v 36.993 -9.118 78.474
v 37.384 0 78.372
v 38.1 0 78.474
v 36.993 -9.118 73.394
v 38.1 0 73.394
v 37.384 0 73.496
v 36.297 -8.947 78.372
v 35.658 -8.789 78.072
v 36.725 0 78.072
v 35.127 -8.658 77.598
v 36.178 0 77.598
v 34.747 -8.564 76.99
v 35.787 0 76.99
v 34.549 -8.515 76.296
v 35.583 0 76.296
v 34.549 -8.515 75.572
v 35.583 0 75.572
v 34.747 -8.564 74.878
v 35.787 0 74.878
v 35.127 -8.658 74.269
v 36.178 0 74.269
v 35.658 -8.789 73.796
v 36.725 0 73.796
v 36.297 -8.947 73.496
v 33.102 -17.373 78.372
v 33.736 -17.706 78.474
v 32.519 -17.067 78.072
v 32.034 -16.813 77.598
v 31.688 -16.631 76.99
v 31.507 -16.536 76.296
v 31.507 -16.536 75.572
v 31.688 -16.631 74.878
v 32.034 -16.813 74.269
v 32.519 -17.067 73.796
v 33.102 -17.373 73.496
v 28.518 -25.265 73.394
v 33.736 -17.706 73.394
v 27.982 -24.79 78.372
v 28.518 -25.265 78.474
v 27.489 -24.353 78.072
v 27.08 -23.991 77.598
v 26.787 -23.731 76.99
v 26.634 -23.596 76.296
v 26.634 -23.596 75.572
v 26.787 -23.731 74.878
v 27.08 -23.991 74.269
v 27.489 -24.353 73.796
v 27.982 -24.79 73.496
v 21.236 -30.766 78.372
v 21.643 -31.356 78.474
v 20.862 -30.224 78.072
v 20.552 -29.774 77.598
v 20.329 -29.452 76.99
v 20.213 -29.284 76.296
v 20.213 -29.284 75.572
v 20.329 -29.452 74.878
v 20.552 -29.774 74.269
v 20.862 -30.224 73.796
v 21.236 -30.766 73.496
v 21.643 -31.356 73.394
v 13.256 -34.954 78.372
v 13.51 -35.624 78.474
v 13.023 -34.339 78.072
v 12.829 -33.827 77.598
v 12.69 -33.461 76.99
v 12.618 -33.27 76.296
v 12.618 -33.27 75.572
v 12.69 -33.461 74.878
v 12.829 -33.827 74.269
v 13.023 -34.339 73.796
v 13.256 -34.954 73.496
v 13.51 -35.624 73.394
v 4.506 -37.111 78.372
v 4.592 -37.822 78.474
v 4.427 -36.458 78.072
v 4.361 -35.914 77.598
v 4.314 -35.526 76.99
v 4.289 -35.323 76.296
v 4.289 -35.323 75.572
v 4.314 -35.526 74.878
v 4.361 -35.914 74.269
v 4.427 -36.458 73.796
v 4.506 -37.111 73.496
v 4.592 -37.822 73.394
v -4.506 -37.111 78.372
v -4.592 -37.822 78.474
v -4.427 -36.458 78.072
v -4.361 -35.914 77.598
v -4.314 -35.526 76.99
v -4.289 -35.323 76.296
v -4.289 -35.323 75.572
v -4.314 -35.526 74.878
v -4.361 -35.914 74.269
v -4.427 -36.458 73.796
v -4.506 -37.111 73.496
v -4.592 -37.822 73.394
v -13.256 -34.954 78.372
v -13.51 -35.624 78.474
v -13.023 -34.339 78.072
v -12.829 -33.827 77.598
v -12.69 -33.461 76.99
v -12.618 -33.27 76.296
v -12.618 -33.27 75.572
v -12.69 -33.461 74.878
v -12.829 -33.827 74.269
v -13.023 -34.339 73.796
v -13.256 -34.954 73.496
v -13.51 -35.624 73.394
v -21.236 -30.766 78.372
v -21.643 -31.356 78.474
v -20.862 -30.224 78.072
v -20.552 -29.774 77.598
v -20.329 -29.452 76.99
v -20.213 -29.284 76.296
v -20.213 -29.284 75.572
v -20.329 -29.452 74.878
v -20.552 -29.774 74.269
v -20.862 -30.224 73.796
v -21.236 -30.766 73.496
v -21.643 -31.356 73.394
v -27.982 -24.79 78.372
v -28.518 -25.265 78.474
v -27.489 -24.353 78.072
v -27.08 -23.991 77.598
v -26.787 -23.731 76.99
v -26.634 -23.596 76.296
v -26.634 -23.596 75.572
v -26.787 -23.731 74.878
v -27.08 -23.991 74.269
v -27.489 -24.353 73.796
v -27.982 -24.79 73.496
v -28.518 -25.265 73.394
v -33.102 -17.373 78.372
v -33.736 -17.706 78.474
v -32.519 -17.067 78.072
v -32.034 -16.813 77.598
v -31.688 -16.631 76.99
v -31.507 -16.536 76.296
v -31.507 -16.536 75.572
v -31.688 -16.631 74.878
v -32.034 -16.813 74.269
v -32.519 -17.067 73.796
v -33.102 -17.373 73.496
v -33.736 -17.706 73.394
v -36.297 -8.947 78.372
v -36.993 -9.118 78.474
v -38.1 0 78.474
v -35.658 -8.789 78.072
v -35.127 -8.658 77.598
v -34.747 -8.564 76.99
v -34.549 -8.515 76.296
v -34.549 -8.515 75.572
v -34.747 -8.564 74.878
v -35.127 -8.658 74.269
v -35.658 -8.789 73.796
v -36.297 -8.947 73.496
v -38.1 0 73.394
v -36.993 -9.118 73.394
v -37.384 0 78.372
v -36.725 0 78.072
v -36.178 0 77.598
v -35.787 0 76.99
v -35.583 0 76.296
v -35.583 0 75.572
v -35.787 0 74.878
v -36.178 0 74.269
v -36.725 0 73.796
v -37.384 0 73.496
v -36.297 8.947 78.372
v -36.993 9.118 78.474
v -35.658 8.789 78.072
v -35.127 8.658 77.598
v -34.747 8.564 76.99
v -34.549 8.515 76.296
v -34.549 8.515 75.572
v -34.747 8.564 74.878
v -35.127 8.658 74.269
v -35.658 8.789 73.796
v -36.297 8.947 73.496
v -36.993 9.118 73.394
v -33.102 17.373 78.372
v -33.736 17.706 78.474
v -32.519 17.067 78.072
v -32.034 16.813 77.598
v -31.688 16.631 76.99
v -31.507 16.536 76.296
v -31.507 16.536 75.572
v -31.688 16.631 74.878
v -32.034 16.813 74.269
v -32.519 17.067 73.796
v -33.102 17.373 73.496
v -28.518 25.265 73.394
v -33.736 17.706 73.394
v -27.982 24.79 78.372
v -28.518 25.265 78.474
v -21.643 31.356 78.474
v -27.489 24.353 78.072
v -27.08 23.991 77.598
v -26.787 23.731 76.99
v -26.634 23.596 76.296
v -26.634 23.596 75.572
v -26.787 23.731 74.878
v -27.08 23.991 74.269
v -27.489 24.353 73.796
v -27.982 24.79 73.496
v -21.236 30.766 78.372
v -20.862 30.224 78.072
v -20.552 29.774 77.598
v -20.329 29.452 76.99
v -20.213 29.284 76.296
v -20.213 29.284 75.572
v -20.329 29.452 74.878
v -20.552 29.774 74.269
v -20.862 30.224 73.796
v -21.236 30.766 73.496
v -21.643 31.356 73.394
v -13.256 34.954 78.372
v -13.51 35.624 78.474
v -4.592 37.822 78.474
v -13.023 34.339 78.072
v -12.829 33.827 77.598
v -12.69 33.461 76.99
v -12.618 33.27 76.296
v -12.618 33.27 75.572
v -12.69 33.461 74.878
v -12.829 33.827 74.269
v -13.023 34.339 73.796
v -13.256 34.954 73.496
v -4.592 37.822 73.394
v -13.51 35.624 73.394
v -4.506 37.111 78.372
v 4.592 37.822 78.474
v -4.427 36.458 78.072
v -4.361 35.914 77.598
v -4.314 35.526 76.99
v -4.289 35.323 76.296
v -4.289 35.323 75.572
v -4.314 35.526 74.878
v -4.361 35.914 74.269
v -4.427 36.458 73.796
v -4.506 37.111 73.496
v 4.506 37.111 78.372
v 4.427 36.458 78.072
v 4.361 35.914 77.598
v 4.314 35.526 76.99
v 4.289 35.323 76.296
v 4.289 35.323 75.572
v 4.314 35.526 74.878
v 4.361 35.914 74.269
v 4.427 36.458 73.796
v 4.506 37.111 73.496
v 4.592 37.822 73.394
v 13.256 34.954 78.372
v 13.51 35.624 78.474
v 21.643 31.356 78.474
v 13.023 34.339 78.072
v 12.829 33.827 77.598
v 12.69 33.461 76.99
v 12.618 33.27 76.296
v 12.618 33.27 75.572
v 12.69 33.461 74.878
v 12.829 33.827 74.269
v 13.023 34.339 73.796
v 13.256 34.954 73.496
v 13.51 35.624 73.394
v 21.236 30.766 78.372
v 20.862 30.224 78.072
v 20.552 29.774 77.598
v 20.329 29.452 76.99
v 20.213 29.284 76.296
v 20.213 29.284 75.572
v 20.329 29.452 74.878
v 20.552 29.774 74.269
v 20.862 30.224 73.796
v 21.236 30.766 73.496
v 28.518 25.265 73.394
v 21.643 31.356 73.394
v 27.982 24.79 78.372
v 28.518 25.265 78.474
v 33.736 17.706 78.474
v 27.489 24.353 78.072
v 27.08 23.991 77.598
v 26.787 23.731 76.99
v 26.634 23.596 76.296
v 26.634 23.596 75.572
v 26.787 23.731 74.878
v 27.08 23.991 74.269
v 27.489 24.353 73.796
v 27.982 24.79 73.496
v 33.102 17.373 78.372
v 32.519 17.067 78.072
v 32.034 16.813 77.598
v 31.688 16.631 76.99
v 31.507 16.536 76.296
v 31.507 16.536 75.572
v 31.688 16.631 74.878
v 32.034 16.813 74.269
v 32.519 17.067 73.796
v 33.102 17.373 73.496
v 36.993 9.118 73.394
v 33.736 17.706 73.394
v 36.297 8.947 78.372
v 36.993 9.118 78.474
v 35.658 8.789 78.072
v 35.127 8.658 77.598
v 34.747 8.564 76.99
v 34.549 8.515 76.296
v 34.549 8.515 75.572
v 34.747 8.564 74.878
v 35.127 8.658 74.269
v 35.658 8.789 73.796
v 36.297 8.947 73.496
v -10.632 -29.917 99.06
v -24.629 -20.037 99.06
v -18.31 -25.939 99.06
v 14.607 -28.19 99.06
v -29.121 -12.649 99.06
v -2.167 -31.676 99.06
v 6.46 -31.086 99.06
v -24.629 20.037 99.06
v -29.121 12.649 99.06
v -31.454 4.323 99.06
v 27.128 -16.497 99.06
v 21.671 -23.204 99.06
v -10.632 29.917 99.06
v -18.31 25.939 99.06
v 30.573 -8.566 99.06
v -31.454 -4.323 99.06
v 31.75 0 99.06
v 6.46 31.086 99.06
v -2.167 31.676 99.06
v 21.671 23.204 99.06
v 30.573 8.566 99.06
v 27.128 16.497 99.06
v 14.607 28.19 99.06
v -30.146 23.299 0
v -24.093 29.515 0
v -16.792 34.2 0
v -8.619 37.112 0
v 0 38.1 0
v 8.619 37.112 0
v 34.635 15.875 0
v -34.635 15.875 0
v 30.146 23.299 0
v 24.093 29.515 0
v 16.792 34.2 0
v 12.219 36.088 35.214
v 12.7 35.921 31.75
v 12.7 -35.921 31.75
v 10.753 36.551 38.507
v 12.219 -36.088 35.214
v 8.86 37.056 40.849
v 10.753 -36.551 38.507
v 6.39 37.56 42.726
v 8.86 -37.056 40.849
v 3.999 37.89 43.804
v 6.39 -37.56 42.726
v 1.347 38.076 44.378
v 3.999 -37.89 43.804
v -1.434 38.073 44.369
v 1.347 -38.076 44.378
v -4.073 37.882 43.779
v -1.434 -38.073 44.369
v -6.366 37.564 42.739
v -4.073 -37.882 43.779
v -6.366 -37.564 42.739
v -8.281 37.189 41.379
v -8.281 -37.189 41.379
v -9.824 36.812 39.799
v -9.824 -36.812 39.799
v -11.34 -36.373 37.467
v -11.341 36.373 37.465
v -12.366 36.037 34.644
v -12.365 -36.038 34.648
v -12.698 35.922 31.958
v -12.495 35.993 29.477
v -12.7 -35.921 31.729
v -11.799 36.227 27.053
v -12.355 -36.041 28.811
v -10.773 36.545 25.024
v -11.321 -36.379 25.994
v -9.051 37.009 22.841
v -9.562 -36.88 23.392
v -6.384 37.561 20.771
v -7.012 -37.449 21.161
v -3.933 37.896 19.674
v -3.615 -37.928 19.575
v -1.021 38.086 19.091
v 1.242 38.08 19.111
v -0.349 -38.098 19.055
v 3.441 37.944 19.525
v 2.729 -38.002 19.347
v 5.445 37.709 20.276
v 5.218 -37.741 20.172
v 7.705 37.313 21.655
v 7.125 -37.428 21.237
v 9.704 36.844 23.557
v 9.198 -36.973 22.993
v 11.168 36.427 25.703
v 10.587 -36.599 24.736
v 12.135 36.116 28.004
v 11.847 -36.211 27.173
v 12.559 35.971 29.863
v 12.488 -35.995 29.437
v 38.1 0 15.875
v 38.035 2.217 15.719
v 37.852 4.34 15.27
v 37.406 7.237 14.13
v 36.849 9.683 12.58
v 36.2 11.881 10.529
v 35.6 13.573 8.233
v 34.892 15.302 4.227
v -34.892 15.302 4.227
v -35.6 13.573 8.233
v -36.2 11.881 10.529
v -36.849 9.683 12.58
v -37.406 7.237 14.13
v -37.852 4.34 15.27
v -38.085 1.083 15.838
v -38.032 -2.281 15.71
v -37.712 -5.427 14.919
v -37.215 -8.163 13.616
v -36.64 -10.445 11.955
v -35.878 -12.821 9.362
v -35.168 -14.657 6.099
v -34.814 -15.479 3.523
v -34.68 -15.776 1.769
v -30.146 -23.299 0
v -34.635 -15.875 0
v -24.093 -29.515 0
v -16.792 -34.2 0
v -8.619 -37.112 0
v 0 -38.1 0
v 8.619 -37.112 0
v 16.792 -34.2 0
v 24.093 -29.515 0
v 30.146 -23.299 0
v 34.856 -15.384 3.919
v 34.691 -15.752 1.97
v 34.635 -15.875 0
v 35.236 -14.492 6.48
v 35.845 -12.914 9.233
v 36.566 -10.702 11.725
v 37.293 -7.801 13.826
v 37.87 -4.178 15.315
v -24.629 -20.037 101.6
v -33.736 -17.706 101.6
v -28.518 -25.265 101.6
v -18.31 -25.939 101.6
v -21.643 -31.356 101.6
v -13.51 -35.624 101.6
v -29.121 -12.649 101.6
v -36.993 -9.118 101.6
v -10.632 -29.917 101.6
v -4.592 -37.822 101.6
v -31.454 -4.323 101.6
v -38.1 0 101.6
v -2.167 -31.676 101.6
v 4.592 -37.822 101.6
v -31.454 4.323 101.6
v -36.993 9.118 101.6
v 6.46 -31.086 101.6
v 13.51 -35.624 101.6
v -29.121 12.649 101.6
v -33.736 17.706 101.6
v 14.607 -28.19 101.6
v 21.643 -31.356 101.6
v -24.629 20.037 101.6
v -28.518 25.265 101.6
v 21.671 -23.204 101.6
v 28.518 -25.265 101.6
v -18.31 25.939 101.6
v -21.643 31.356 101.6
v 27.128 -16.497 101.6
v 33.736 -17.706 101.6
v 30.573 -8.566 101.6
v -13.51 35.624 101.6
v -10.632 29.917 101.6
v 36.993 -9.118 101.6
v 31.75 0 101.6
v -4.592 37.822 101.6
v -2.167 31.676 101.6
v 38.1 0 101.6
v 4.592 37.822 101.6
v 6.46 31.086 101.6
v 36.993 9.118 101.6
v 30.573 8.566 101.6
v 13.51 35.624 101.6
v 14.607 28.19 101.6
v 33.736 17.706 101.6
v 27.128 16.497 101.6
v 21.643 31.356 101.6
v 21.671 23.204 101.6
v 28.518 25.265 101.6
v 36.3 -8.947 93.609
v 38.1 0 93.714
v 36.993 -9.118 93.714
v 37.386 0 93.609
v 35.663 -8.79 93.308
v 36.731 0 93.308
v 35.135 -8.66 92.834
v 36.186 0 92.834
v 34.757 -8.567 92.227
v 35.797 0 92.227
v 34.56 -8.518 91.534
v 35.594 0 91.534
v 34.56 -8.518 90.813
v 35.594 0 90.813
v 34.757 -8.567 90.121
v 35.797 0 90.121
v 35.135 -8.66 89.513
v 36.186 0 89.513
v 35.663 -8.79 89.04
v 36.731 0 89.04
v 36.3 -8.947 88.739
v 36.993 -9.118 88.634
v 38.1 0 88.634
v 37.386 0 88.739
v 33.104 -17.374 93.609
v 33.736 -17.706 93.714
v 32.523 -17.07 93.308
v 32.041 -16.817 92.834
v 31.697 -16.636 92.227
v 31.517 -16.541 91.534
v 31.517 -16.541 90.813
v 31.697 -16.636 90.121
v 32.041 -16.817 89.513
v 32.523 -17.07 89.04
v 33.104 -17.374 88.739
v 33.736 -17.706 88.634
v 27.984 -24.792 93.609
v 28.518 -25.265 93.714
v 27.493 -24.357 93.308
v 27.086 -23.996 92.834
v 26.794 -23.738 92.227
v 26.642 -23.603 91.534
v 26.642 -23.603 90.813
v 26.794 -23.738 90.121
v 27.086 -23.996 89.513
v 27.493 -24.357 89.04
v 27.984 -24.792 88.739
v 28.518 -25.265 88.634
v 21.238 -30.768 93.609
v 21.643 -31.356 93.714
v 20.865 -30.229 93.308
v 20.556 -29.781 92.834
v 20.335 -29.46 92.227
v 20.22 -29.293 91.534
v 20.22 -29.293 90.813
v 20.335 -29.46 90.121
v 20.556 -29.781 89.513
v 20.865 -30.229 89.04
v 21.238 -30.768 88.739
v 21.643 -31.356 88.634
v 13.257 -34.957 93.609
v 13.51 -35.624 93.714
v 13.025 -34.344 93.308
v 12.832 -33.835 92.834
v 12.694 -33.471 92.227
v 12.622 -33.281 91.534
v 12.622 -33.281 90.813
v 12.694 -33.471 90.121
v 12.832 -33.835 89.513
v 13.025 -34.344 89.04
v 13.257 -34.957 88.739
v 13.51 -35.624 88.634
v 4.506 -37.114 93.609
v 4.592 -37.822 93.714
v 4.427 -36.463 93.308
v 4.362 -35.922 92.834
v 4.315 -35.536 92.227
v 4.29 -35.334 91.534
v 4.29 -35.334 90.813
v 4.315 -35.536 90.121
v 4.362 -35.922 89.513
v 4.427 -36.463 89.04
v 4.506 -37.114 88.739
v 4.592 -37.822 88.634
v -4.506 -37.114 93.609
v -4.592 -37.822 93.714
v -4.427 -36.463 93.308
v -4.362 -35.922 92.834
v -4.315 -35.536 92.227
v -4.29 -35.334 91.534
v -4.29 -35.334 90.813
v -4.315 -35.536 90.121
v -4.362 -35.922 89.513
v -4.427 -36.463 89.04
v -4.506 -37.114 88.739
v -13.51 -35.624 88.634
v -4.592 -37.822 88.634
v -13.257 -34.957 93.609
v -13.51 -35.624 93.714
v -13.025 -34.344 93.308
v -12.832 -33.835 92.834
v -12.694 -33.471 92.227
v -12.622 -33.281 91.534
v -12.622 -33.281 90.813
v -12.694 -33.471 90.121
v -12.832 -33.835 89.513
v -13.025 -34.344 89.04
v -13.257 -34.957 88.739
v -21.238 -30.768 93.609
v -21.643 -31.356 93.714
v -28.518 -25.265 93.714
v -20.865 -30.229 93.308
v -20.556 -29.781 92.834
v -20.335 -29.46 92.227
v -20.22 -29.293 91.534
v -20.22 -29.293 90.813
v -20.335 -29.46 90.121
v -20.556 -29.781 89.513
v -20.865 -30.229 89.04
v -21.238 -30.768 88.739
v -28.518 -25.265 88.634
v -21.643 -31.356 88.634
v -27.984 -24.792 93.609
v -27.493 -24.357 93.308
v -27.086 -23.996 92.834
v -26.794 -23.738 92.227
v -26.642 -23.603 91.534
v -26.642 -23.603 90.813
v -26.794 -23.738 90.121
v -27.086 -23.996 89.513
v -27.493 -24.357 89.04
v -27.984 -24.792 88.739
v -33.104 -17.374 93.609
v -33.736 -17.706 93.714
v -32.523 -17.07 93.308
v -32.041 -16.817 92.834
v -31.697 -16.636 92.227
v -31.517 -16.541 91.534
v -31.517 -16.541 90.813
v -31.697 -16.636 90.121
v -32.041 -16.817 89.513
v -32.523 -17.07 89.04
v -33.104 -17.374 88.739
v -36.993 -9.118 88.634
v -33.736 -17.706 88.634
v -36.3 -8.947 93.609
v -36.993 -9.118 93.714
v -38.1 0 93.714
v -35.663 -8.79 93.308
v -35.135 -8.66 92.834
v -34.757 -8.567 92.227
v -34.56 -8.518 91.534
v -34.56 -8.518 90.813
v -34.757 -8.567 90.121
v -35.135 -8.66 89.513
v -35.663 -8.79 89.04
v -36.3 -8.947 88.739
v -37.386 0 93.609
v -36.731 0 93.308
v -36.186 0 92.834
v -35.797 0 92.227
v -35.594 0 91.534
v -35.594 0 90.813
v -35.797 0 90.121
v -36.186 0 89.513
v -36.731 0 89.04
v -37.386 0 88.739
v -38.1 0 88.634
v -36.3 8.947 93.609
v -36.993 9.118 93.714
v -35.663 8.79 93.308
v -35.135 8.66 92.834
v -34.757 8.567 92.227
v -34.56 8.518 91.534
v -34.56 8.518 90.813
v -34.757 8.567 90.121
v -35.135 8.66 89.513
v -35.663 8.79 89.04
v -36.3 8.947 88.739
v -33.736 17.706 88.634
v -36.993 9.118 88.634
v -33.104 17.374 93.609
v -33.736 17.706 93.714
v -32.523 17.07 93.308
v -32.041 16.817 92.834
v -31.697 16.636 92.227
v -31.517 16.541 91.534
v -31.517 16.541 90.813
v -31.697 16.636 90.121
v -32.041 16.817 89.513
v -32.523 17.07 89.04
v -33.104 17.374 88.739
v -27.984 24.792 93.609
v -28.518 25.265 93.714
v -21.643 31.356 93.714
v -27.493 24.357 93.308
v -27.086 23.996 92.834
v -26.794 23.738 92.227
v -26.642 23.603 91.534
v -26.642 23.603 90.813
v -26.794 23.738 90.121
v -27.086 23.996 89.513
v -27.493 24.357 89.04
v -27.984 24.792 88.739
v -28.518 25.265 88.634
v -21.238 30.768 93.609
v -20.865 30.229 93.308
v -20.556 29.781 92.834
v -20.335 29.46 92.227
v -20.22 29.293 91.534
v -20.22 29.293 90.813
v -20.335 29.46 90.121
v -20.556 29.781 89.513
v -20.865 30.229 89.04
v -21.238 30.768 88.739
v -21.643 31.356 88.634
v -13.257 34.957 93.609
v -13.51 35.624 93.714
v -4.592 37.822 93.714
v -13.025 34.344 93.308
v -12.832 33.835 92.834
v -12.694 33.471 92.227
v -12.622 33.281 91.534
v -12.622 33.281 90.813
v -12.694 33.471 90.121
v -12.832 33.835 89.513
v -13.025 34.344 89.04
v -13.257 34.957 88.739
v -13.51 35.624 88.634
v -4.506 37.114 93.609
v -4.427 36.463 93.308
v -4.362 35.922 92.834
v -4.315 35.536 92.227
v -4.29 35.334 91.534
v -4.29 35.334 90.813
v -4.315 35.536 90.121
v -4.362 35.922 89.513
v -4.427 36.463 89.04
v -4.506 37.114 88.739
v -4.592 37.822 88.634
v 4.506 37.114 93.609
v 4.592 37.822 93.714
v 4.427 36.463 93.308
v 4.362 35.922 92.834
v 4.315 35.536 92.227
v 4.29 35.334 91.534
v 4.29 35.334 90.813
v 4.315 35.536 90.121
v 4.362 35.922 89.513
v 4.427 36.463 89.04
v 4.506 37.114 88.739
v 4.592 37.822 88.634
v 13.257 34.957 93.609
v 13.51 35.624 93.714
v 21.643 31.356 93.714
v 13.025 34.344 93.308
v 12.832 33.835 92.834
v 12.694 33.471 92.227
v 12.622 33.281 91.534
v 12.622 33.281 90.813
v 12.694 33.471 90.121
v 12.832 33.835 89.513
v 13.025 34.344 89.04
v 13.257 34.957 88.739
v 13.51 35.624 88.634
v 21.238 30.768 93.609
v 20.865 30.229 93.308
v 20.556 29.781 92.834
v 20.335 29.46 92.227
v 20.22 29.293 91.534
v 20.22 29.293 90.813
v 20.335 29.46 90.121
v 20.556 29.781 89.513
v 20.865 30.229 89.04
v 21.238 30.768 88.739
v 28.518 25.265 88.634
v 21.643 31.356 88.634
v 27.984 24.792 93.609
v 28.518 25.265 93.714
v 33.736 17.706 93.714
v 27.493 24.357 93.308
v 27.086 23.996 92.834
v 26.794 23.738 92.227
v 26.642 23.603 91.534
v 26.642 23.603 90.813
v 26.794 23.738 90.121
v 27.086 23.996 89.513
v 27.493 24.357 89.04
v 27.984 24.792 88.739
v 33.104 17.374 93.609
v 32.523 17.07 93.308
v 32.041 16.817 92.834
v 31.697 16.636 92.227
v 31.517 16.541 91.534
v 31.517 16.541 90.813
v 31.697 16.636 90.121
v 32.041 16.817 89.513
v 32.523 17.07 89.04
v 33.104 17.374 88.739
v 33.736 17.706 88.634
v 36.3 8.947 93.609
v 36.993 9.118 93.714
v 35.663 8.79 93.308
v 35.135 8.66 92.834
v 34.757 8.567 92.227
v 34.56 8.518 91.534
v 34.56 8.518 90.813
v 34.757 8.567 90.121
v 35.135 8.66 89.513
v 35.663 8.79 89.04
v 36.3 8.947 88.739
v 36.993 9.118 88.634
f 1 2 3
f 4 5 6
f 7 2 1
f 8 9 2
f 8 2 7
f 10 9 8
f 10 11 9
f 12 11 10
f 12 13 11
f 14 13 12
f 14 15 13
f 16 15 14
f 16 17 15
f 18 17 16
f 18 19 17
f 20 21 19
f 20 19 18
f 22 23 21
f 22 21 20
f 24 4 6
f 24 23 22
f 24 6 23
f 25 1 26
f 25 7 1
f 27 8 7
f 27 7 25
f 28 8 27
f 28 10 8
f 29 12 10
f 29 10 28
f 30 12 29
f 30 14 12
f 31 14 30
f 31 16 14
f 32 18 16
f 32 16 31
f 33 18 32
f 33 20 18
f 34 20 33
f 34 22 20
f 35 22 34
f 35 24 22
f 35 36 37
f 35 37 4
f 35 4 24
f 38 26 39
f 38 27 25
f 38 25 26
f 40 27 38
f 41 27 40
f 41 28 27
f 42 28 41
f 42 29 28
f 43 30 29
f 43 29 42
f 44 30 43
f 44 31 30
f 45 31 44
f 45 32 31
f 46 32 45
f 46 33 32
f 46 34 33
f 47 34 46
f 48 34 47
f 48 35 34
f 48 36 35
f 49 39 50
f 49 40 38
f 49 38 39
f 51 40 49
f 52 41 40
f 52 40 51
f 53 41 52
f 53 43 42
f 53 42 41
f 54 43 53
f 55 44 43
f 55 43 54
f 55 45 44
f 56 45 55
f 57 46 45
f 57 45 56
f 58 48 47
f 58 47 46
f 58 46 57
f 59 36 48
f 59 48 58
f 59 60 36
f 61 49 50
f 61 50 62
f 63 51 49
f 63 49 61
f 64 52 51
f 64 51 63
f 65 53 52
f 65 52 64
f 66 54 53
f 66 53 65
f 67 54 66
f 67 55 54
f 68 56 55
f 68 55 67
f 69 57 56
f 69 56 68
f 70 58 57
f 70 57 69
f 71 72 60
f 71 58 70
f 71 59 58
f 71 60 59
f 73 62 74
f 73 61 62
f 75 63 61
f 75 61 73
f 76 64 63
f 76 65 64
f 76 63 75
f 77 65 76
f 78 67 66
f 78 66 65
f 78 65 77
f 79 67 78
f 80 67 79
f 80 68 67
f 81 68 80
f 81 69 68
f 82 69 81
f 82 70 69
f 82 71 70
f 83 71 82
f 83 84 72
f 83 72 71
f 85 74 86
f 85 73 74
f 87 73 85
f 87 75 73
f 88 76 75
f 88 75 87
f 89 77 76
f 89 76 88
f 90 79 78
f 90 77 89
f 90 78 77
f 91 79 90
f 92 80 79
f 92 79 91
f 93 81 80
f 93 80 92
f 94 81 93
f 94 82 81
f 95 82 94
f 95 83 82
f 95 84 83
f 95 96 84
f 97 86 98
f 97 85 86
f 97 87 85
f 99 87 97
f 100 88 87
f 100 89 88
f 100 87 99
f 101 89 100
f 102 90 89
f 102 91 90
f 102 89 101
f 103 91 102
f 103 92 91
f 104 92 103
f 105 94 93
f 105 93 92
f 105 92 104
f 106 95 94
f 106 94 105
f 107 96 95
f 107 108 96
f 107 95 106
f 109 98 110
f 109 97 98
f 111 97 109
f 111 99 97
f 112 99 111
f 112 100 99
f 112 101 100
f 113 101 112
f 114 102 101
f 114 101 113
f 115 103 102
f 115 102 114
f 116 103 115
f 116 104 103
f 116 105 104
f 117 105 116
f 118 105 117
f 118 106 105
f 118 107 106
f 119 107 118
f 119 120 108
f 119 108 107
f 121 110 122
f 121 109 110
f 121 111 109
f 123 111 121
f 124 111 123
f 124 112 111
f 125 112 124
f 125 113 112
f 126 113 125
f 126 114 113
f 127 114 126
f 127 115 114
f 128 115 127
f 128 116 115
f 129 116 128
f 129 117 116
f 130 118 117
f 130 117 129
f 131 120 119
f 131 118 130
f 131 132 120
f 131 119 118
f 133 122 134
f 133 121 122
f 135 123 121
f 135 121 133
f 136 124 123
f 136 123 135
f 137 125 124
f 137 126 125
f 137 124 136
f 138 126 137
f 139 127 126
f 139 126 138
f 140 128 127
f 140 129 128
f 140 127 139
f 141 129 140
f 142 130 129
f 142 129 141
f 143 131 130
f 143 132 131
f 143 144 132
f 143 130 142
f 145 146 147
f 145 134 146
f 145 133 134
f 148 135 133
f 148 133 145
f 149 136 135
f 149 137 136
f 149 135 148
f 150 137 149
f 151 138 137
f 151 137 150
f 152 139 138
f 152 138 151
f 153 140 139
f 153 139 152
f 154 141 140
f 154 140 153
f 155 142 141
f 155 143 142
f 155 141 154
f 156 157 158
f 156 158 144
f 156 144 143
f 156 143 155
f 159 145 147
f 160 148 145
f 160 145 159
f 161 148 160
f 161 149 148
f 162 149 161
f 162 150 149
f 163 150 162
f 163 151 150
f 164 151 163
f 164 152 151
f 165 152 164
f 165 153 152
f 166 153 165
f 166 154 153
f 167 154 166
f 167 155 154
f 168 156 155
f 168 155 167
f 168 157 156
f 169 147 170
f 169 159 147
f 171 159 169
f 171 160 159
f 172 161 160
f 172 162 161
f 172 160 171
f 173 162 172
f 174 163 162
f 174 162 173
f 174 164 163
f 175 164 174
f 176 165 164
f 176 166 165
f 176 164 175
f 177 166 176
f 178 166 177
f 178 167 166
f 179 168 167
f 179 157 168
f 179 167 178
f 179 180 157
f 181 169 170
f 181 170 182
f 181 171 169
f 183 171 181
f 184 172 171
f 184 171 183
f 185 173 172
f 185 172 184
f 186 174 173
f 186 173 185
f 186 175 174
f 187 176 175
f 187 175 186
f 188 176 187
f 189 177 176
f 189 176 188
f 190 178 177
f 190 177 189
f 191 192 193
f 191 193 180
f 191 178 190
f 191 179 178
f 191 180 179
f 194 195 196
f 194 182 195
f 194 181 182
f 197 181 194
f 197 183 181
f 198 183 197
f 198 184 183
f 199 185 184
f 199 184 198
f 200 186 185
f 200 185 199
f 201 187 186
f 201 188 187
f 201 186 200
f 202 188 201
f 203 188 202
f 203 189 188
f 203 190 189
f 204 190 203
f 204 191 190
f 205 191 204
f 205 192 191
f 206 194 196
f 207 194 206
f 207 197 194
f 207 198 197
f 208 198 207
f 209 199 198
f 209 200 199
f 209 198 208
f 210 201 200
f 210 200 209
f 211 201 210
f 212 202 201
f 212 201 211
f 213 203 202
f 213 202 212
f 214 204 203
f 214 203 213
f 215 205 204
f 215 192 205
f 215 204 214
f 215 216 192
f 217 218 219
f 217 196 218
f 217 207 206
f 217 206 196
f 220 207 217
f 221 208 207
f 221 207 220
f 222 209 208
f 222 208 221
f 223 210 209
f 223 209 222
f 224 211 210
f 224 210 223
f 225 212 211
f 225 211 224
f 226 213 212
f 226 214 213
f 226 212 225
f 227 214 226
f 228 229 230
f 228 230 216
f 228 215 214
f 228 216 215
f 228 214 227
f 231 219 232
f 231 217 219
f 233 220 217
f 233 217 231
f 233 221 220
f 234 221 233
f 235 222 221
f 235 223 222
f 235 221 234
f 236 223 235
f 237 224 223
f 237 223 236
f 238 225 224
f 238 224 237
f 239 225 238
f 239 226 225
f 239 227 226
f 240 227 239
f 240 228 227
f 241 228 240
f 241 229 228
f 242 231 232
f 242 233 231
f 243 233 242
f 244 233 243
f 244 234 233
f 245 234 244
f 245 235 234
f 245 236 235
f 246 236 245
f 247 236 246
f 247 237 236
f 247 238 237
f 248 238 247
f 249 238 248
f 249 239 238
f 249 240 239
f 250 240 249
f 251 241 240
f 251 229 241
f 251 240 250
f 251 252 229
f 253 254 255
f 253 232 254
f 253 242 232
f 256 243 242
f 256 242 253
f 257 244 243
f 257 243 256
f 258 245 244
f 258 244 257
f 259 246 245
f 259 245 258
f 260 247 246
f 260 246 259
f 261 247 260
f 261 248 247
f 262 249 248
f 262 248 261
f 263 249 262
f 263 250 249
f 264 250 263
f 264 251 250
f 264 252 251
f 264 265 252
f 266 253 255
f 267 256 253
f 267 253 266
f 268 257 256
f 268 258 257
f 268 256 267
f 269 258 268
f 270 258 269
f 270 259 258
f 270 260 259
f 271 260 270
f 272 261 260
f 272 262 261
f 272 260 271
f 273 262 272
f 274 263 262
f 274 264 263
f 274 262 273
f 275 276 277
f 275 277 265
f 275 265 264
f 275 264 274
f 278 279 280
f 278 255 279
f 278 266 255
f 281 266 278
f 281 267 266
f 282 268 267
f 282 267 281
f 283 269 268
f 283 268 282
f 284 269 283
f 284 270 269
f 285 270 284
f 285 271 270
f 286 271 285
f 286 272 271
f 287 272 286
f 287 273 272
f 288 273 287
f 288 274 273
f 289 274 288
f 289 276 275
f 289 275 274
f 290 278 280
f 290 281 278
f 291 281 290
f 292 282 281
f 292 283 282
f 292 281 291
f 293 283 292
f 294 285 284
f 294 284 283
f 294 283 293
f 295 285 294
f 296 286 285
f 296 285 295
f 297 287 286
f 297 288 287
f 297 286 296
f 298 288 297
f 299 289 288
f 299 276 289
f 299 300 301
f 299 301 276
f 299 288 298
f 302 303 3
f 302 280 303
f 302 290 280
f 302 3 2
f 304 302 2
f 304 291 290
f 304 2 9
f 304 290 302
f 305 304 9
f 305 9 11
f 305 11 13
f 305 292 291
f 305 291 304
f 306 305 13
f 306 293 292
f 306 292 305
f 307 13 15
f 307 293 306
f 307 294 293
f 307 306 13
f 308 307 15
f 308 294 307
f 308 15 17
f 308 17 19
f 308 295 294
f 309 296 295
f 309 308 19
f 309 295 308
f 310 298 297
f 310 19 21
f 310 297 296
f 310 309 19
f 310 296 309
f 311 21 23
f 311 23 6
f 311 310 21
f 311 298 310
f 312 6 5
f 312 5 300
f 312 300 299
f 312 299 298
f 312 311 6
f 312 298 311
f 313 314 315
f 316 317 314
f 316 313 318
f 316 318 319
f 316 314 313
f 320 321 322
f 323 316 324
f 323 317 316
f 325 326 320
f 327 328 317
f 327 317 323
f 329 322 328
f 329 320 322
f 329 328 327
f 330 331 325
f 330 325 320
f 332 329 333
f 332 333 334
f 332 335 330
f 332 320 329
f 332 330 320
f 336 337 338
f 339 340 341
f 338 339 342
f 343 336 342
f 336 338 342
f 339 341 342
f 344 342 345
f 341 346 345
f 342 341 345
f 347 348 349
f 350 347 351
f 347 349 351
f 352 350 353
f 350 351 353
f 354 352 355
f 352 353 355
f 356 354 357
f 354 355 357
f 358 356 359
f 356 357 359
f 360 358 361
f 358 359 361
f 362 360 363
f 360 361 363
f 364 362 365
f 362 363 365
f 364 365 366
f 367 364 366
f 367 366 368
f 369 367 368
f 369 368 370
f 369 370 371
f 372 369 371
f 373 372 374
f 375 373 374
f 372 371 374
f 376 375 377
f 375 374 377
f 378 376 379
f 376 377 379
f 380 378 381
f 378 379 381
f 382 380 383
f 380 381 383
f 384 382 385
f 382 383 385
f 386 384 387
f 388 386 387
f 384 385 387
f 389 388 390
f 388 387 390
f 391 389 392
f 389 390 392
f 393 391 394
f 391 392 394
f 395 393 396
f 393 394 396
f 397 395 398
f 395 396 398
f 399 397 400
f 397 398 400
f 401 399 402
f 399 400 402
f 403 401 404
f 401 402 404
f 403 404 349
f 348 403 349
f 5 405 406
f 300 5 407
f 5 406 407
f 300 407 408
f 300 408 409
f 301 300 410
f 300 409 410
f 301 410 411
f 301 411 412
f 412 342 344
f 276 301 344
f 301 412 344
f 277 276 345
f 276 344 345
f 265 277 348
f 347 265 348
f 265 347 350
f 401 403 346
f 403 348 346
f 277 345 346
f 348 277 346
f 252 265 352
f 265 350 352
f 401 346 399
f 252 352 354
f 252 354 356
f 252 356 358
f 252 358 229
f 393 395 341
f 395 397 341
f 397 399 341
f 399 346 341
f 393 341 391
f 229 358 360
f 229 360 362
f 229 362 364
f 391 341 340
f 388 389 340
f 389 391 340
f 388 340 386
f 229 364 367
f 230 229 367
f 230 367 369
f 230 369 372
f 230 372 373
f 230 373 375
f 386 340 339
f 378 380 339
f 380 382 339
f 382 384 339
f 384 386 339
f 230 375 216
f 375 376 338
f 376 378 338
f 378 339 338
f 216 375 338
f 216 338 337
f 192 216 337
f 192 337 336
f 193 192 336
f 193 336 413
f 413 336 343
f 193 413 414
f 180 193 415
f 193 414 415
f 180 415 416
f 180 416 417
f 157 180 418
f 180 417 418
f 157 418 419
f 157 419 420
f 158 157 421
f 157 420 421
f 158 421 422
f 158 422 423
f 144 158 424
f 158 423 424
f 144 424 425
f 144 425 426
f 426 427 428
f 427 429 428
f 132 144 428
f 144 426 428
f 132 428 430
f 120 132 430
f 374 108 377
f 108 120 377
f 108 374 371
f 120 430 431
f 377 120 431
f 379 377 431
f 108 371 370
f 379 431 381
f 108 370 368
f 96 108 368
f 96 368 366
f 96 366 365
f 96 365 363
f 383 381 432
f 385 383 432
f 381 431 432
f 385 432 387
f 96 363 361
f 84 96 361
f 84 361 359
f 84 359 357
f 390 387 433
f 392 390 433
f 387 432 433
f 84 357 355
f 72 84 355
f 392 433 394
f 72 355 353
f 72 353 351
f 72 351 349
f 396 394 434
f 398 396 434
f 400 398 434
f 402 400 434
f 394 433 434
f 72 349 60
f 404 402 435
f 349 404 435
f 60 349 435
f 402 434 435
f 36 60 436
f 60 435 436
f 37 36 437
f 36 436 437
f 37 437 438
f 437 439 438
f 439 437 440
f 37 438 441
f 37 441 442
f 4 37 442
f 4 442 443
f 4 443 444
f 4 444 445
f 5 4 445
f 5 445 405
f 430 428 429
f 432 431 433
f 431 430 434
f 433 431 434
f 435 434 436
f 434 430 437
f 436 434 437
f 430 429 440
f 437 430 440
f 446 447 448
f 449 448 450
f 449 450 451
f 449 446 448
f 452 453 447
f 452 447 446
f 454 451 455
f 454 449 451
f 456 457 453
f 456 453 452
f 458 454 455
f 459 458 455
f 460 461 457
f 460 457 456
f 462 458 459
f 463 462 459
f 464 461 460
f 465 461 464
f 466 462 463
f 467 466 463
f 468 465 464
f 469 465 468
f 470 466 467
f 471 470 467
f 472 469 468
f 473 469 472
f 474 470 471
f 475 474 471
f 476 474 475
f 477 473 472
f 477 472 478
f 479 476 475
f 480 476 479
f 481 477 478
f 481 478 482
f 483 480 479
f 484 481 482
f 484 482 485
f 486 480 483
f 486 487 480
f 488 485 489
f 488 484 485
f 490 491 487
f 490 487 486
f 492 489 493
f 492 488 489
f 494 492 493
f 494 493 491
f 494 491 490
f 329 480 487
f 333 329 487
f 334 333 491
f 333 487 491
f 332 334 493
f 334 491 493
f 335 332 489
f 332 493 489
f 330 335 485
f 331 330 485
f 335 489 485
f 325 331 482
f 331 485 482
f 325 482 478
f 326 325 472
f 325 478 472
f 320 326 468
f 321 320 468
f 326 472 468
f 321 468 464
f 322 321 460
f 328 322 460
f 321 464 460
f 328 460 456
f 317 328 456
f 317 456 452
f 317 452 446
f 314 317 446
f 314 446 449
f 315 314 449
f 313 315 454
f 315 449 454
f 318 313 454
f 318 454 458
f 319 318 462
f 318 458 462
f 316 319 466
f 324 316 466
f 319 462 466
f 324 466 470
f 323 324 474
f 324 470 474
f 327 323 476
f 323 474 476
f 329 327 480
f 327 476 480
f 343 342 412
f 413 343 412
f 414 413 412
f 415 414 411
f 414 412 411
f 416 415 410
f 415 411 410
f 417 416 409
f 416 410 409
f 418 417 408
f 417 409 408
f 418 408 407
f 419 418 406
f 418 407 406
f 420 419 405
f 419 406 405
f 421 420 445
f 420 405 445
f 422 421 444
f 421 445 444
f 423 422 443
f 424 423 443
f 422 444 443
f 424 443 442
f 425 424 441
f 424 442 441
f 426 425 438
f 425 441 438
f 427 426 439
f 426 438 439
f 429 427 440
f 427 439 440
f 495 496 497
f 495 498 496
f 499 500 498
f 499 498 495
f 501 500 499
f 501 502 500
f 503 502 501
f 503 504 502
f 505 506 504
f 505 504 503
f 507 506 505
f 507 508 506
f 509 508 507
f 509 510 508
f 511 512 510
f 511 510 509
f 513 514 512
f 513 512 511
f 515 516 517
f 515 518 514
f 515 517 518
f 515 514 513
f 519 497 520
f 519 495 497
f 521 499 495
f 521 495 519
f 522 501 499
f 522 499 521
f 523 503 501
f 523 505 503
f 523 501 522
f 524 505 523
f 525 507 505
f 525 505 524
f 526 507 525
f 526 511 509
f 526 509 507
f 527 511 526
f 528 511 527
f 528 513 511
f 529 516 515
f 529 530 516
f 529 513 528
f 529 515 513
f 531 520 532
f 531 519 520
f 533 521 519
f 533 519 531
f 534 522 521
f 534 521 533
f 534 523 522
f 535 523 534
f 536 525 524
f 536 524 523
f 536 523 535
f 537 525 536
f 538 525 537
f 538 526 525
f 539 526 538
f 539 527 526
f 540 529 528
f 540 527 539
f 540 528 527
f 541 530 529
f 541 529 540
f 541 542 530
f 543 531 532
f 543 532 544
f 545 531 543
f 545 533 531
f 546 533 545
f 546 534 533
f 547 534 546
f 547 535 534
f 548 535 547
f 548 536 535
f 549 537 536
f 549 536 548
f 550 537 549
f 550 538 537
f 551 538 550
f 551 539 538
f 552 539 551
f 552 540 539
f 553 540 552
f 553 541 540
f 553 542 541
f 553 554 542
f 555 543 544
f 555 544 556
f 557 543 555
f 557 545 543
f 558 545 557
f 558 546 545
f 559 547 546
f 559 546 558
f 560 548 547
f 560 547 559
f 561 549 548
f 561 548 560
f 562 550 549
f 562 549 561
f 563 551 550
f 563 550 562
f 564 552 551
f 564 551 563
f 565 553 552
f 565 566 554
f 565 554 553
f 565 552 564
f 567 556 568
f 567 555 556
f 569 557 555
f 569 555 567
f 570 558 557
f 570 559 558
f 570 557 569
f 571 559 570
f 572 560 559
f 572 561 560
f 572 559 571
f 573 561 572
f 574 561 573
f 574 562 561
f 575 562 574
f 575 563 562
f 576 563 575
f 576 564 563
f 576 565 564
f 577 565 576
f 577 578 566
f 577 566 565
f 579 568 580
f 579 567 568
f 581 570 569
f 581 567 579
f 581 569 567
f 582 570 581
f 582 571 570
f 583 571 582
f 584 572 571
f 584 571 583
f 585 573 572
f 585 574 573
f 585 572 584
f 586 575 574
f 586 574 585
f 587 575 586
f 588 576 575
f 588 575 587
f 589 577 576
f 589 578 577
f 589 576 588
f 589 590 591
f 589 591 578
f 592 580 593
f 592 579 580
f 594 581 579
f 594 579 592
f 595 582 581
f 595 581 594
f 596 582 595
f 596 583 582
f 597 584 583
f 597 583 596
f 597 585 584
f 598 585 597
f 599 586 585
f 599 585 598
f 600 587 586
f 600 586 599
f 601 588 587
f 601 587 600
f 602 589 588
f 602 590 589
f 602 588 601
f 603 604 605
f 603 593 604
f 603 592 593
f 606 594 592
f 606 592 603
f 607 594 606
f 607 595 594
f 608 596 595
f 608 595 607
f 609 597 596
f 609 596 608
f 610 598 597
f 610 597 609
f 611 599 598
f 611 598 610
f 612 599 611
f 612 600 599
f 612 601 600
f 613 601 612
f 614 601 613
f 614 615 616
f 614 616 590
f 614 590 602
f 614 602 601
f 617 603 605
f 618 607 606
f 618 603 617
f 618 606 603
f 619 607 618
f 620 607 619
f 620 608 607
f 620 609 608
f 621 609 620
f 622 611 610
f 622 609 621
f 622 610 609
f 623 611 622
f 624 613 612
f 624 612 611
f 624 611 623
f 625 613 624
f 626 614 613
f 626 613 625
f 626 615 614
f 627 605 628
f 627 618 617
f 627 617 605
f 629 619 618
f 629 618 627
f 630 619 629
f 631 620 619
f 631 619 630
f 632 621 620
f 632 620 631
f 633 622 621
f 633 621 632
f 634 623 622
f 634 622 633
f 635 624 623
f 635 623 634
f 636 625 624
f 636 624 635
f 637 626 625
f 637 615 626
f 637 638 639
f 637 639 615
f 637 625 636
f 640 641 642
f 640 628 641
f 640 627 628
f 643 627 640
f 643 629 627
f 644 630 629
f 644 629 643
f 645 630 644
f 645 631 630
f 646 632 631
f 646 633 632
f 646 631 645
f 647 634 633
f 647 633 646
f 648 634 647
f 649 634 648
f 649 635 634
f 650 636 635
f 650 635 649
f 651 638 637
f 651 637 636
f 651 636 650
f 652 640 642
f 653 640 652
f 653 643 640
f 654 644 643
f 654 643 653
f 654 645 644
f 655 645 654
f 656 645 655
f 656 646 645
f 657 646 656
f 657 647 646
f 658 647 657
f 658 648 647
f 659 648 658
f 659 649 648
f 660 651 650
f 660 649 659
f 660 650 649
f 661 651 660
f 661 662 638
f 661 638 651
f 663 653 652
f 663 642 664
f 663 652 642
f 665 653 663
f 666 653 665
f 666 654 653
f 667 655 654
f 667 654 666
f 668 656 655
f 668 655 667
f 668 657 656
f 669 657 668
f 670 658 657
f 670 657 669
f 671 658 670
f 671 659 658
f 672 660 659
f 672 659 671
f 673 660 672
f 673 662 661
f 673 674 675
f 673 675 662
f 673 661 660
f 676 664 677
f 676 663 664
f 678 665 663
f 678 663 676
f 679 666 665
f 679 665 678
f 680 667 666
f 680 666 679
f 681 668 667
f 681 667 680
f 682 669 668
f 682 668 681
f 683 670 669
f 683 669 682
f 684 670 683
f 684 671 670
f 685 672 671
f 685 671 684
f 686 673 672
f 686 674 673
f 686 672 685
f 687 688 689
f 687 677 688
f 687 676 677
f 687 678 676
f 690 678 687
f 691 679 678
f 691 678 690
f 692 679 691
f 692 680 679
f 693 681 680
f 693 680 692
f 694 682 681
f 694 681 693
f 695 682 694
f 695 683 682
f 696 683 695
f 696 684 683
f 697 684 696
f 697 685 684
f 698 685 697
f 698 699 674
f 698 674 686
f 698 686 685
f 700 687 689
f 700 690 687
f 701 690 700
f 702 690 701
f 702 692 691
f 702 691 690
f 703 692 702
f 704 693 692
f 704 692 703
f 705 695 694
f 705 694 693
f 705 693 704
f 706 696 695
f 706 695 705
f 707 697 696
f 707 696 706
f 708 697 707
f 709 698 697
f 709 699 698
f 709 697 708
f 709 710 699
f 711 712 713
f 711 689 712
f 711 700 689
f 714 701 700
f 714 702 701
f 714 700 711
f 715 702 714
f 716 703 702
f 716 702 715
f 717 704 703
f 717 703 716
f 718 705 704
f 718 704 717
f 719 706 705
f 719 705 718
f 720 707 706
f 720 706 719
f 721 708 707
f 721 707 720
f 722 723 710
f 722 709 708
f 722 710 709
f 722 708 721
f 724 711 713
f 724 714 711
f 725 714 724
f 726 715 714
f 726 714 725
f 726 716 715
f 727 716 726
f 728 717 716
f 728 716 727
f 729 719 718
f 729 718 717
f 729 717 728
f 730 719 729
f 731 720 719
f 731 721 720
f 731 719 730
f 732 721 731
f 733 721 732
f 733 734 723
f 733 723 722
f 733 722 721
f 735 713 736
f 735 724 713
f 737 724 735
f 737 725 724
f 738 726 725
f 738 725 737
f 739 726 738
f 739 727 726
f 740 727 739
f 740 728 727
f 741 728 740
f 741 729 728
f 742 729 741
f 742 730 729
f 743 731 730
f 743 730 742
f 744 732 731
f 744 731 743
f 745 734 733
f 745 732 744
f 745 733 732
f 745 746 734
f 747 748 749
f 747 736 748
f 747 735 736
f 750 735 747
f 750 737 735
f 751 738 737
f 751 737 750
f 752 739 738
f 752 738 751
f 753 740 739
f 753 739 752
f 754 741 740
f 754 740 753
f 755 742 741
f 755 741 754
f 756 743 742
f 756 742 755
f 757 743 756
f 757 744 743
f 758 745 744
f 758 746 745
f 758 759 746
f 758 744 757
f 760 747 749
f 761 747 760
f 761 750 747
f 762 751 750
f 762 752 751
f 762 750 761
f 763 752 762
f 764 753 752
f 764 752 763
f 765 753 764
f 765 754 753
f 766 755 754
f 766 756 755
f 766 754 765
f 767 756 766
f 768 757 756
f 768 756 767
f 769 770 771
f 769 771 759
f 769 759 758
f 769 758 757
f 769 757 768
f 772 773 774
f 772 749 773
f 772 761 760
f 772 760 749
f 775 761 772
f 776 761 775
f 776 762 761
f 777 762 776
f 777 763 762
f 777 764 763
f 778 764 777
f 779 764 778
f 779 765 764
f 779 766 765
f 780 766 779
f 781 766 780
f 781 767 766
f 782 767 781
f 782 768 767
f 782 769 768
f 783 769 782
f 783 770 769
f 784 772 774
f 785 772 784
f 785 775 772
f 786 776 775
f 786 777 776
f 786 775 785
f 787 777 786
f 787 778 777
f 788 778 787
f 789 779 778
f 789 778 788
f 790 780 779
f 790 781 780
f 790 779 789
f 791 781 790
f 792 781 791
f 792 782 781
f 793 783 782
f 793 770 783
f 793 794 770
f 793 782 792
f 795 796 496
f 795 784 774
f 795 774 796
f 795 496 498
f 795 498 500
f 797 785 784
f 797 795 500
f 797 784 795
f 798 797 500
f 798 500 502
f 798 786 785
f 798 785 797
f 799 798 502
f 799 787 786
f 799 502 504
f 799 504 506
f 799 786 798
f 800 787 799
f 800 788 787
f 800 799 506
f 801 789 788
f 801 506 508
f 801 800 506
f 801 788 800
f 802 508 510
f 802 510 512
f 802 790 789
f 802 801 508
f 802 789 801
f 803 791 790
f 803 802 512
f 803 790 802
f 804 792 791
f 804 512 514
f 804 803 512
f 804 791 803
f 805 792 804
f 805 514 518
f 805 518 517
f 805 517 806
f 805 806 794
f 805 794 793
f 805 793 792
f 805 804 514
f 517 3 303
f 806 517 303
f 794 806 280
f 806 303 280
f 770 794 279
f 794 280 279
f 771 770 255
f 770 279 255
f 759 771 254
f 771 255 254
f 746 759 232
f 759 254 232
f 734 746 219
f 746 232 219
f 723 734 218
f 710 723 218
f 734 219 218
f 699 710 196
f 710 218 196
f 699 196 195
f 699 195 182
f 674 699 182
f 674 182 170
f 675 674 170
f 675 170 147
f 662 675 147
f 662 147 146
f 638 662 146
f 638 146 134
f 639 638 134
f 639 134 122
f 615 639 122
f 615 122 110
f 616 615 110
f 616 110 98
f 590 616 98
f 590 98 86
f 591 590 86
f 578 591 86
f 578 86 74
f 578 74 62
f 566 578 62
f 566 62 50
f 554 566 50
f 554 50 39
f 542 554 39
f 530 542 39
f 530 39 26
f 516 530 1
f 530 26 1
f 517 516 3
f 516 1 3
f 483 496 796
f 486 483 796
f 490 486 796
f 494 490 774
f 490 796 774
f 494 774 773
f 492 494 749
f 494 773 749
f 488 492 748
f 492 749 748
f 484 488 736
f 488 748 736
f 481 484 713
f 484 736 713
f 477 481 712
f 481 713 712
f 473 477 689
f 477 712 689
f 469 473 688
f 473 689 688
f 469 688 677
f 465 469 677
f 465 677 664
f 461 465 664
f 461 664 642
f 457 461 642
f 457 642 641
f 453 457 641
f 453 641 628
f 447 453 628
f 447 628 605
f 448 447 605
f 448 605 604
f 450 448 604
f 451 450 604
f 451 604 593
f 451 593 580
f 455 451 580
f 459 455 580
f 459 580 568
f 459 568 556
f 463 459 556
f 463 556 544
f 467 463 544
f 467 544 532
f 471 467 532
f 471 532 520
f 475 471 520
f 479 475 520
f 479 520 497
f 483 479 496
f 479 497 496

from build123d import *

# Parameters (mm, degrees)
F0_R      = 38.1
F1_DEPTH  = 101.6
F2_R      = 2.54
F4_R      = 2.54
F6_R      = 12.7
F7_DEPTH  = 50.8
F8_R      = 15.875
F9_DEPTH  = 50.8
F11_R     = 31.75
F12_DEPTH = 2.54


with BuildPart() as f1:
    # F0 (on Top) → F1 (new body)
    with BuildSketch(Plane.XY):
        Circle(F0_R)
    extrude(amount=F1_DEPTH)

    # F2 (on Front) → F3 (revolve, cut)
    with BuildSketch(Plane.XZ):
        with Locations((38.108225, 91.173758)):
            Circle(F2_R)
    revolve(axis=Axis((0, 0, 0), (0, 0, -1)), mode=Mode.SUBTRACT)

    # F4 (on Front) → F5 (revolve, cut)
    with BuildSketch(Plane.XZ):
        with Locations((38.096763, 75.933771)):
            Circle(F4_R)
    revolve(axis=Axis((0, 0, 0), (0, 0, -1)), mode=Mode.SUBTRACT)

    # F6 (on Front) → F7 (cut, symmetric)
    with BuildSketch(Plane.XZ):
        with Locations((0, 31.75)):
            Circle(F6_R)
    extrude(amount=F7_DEPTH, both=True, mode=Mode.SUBTRACT)

    # F8 (on Right) → F9 (cut, symmetric)
    with BuildSketch(Plane.YZ):
        Circle(F8_R)
    extrude(amount=F9_DEPTH, both=True, mode=Mode.SUBTRACT)

    # F11 (on offset) → F12 (cut)
    with BuildSketch(Plane.XY.offset(101.6)):
        Circle(F11_R)
    extrude(amount=-F12_DEPTH, mode=Mode.SUBTRACT)


solid = f1.part
